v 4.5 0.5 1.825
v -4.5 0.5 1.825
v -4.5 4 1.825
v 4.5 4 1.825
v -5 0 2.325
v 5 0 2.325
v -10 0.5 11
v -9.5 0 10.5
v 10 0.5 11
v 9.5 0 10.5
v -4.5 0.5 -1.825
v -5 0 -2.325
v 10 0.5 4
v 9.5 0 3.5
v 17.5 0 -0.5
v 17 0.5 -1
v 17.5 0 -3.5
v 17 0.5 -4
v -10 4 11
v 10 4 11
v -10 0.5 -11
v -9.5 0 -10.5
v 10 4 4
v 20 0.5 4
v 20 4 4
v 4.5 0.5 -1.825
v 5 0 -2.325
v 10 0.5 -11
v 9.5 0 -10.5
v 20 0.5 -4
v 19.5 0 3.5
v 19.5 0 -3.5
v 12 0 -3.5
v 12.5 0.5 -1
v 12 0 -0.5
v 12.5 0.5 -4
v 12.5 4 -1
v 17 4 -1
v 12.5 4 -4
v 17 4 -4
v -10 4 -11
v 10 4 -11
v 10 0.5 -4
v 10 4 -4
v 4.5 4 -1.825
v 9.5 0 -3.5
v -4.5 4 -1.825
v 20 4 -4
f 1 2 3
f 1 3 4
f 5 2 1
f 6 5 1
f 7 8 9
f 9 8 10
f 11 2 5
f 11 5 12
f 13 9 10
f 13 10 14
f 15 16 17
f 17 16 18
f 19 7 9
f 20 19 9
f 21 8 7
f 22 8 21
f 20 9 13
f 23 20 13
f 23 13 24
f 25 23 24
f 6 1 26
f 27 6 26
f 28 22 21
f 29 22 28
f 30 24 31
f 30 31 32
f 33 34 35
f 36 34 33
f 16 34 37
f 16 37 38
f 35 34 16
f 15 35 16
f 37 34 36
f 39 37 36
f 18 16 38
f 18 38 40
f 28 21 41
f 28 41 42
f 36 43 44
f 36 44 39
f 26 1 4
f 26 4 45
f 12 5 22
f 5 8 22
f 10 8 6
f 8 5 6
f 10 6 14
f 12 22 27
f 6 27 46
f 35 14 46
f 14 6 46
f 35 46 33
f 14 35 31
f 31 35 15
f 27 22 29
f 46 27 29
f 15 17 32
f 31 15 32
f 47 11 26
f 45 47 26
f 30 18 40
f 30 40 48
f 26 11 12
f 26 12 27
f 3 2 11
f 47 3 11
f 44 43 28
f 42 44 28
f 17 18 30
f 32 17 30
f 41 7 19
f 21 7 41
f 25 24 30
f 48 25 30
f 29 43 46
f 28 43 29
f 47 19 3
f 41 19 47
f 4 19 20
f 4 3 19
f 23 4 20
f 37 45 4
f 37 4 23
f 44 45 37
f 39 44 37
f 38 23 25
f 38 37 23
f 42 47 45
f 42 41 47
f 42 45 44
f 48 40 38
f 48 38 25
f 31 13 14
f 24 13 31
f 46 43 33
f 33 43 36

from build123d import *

# Parameters (mm, degrees)
SKETCH1_W           = 20
SKETCH1_H           = 22
SKETCH1_W_2         = 9
SKETCH1_H_2         = 3.65
BOSS_EXTRUDE1_DEPTH = 4
SKETCH2_W           = 10
SKETCH2_H           = 8
BOSS_EXTRUDE3_DEPTH = 4
SKETCH3_W           = 4.5
SKETCH3_H           = 3
CUT_EXTRUDE1_DEPTH  = 24.173260453
CHAMFER1_SIZE       = 0.5


with BuildPart() as part:
    # Sketch1 → Boss-Extrude1 (new body)
    with BuildSketch(Plane(origin=(0, 0, 0), x_dir=(1, 0, 0), z_dir=(0, 1, 0))):
        Rectangle(SKETCH1_W, SKETCH1_H)
        Rectangle(SKETCH1_W_2, SKETCH1_H_2, mode=Mode.SUBTRACT)
    extrude(amount=BOSS_EXTRUDE1_DEPTH)

    # Sketch2 → Boss-Extrude3 (add)
    with BuildSketch(Plane(origin=(0, 0, 0), x_dir=(1, 0, 0), z_dir=(0, 1, 0))):
        with Locations((15, 0)):
            Rectangle(SKETCH2_W, SKETCH2_H)
    extrude(amount=BOSS_EXTRUDE3_DEPTH)

    # Sketch3 → Cut-Extrude1 (cut, through all)
    with BuildSketch(Plane(origin=(0, 0, 0), x_dir=(1, 0, 0), z_dir=(0, 1, 0))):
        with Locations((14.75, 2.5)):
            Rectangle(SKETCH3_W, SKETCH3_H)
    extrude(amount=CUT_EXTRUDE1_DEPTH, mode=Mode.SUBTRACT)

    # Chamfer1
    chamfer1_edges = [part.edges().sort_by_distance(p)[0] for p in [
        (4.5, 0, 0),
        (0, 0, -1.825),
        (-4.5, 0, 0),
        (0, 0, 1.825),
        (10, 0, -7.5),
        (15, 0, 4),
        (20, 0, 0),
        (18.5, 0, -4),
        (11.25, 0, -4),
        (12.5, 0, -2.5),
        (14.75, 0, -1),
        (17, 0, -2.5),
        (0, 0, -11),
        (10, 0, 7.5),
        (0, 0, 11),
        (-10, 0, 0),
    ]]
    chamfer(chamfer1_edges, length=CHAMFER1_SIZE)


solid = part.part
